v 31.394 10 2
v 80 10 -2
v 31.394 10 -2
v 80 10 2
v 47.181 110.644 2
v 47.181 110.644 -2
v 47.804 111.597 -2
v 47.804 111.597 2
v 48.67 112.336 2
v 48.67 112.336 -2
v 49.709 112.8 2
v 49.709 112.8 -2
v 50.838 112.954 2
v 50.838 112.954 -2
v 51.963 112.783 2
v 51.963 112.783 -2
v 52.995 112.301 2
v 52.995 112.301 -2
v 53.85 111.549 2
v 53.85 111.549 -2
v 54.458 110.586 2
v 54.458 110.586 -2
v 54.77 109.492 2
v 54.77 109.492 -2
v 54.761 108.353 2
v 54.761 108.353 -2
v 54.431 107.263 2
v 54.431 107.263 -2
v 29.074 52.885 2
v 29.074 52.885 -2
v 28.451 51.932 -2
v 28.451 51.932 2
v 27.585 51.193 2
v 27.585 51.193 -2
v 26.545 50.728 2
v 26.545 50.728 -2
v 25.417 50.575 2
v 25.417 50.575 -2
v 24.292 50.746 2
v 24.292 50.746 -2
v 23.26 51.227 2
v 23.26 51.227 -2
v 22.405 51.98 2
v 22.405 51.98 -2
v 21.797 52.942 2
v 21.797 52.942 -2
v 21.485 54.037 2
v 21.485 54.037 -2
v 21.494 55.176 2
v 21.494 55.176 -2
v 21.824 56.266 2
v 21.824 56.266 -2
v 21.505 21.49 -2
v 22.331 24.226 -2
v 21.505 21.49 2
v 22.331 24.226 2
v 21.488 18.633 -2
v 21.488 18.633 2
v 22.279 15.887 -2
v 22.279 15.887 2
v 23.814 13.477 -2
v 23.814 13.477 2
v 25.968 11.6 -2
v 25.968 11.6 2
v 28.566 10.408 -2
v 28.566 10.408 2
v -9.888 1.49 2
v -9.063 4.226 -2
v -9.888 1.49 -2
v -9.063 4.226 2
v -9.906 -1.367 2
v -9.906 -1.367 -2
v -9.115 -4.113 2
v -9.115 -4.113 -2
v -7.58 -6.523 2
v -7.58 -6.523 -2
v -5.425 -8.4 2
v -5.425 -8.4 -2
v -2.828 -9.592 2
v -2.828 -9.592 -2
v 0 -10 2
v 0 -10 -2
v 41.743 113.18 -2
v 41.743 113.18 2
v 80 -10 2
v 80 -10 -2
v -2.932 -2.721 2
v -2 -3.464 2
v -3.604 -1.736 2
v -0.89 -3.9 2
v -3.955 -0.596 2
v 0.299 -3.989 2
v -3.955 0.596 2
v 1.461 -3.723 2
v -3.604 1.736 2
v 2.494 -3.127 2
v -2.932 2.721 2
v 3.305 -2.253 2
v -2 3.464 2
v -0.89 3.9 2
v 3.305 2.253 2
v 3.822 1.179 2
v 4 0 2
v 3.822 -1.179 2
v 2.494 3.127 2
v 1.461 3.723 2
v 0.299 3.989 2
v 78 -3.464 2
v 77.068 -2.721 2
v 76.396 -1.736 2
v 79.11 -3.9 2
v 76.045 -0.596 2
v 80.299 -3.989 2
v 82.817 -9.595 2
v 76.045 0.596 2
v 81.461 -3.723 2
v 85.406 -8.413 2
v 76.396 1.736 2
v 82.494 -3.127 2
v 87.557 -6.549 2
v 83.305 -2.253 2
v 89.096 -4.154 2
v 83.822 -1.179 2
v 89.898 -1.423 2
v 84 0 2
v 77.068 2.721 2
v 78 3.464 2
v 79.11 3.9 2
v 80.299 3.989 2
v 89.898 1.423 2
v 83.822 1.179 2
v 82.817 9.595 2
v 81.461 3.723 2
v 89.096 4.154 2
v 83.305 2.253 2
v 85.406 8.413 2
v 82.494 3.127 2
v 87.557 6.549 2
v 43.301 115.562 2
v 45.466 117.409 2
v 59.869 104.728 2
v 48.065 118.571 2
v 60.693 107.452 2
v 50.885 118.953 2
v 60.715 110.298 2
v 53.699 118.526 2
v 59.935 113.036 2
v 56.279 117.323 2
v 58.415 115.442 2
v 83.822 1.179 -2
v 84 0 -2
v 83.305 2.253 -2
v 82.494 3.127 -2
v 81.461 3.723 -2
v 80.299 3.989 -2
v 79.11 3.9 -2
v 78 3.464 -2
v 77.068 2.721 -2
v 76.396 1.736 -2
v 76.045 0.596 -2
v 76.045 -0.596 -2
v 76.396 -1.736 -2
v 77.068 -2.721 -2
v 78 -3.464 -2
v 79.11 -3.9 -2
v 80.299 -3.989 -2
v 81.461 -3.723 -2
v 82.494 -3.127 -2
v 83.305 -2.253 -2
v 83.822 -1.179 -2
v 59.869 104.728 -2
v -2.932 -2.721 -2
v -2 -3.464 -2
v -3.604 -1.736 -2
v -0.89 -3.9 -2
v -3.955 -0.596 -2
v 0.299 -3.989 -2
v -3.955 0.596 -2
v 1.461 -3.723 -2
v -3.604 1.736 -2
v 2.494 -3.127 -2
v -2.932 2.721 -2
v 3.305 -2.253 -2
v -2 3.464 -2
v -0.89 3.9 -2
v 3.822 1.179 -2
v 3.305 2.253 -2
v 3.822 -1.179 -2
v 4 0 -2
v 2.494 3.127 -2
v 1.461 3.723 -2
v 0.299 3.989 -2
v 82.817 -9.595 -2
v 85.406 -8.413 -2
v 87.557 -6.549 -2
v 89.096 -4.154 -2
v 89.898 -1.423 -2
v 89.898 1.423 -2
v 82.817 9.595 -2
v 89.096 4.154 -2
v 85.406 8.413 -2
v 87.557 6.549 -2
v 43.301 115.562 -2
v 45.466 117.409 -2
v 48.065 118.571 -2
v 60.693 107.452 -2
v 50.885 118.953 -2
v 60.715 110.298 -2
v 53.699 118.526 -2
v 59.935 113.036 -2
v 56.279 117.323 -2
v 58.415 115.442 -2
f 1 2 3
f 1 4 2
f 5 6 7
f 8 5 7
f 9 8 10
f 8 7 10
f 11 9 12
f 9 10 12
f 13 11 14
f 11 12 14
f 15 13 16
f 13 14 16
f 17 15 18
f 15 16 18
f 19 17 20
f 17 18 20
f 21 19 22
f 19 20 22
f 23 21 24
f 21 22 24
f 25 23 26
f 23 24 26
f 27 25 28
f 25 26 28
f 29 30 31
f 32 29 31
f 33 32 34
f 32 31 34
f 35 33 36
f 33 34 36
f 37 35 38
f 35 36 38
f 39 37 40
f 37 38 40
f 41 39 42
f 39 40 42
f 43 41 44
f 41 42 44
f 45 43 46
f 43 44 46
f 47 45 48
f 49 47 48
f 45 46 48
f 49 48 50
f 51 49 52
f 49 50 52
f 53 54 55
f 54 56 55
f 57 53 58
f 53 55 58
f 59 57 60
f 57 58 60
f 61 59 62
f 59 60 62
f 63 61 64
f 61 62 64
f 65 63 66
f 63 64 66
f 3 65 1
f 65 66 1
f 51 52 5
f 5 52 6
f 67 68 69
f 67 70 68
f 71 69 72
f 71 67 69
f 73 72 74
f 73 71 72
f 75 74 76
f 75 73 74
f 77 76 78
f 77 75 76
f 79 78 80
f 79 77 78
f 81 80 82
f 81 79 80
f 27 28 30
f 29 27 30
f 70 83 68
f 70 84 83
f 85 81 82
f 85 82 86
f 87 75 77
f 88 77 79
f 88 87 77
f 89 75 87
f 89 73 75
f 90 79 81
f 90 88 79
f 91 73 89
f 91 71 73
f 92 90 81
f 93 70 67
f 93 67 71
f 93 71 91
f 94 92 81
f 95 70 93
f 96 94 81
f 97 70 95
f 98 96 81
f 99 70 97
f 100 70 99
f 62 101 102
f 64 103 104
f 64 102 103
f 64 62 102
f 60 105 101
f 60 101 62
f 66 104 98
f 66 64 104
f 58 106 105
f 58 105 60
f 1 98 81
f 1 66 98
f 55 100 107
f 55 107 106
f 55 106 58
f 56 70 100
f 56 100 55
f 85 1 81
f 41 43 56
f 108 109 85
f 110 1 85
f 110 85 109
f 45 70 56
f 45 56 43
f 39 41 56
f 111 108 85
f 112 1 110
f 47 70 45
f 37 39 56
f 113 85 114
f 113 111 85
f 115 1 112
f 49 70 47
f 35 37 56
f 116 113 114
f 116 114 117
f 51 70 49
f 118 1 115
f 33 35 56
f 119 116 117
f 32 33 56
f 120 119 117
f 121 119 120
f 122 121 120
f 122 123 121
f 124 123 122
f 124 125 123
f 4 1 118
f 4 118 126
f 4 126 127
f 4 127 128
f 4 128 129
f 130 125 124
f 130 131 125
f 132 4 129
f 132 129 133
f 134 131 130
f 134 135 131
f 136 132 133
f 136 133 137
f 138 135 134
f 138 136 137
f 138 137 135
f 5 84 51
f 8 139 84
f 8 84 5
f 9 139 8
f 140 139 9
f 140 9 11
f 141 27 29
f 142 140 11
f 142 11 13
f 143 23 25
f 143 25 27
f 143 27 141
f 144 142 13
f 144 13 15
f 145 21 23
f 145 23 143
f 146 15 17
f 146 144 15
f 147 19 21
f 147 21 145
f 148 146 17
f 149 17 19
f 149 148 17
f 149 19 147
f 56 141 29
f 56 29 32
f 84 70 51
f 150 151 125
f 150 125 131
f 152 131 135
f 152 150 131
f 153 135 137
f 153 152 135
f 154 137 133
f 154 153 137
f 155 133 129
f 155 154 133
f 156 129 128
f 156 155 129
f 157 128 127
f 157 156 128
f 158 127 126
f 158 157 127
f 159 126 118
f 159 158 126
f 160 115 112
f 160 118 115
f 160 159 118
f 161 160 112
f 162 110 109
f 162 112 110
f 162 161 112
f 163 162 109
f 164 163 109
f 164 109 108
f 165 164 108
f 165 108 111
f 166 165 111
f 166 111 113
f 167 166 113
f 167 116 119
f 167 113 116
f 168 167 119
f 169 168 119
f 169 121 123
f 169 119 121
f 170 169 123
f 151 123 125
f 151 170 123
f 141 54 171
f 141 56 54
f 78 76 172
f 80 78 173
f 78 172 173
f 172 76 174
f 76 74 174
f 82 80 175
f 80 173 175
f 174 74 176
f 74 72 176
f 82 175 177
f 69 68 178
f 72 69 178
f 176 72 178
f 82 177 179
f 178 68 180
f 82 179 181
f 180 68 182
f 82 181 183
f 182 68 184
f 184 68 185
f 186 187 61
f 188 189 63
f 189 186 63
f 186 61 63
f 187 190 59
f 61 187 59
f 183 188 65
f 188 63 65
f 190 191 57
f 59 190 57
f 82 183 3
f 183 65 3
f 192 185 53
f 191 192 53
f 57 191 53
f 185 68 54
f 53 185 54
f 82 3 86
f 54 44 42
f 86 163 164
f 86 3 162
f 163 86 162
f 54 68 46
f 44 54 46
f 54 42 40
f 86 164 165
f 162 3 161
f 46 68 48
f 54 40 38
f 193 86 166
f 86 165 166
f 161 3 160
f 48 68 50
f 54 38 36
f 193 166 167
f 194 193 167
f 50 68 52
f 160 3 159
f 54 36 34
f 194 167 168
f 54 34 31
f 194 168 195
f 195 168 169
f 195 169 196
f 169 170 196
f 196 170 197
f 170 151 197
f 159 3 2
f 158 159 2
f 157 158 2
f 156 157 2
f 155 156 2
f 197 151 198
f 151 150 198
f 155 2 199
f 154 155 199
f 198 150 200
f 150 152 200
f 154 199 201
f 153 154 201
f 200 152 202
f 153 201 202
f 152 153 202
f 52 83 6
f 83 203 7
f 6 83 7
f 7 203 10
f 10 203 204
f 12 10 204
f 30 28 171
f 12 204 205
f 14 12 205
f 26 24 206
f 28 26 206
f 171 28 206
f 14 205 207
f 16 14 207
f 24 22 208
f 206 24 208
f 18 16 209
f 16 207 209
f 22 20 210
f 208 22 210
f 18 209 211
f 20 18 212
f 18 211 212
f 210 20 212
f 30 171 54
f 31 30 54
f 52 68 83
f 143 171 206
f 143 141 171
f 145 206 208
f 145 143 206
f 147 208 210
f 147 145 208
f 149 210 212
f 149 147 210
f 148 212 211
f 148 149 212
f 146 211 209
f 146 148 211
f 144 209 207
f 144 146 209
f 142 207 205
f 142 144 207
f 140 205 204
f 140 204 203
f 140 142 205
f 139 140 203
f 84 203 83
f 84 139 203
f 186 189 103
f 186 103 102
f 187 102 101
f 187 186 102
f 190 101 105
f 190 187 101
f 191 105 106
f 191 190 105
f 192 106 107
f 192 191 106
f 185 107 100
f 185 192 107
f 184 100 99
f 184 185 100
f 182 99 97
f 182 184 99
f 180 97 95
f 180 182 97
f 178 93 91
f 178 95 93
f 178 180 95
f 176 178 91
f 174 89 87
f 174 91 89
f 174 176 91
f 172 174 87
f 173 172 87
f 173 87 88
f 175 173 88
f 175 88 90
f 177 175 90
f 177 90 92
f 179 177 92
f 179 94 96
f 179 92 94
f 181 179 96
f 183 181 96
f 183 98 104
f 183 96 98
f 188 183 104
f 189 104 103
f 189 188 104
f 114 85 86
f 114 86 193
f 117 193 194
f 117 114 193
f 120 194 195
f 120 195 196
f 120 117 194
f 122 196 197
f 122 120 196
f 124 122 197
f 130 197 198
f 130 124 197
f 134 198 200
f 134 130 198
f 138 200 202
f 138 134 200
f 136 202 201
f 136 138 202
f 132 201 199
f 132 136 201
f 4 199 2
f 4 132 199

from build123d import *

# Parameters (mm, degrees)
BOSS_EXTRUDE1_DEPTH     = 2
CUT_EXTRUDE1_DEPTH      = 150.177687816
CUT_EXTRUDE1_DEPTH_BACK = 150.177687816
CUT_EXTRUDE2_DEPTH      = 150.177687816
CUT_EXTRUDE2_DEPTH_BACK = 150.177687816
SKETCH4_R               = 4
FILLET2_R               = 10


with BuildPart() as part:
    # Sketch2 → Boss-Extrude1 (new, symmetric)
    with BuildSketch(Plane.XY):
        with BuildLine():
            ThreePointArc((0, 10), (-5.372996083, 8.433914458), (-9.06307787, 4.226182617))
            ThreePointArc((-9.06307787, 4.226182617), (-8.433914458, -5.372996083), (0, -10))
            ThreePointArc((0, -10), (5.372996083, -8.433914458), (9.06307787, -4.226182617))
            Line((9.06307787, -4.226182617), (15.696855771, 10))
            Line((15.696855771, 10), (0, 10))
        make_face()
        with BuildLine():
            Line((41.742866429, 113.179881771), (-9.06307787, 4.226182617))
            ThreePointArc((-9.06307787, 4.226182617), (-5.372996083, 8.433914458), (0, 10))
            Line((0, 10), (15.696855771, 10))
            Line((15.696855771, 10), (59.86902217, 104.727516536))
            ThreePointArc((59.86902217, 104.727516536), (55.032126917, 118.016777024), (41.742866429, 113.179881771))
        make_face()
        with BuildLine():
            ThreePointArc((9.06307787, -4.226182617), (5.372996083, -8.433914458), (0, -10))
            Line((0, -10), (80, -10))
            ThreePointArc((80, -10), (90, 0), (80, 10))
            Line((80, 10), (15.696855771, 10))
            Line((15.696855771, 10), (9.06307787, -4.226182617))
        make_face()
    extrude(amount=BOSS_EXTRUDE1_DEPTH, both=True)

    # Sketch3 → Cut-Extrude1 (cut, two sides: drawn at the far end of the back side and taken through both)
    with BuildSketch(Plane.XY.offset(-CUT_EXTRUDE1_DEPTH_BACK)):
        with BuildLine():
            Line((54.431175448, 107.263226106), (29.074079743, 52.884758884))
            ThreePointArc((29.074079743, 52.884758884), (23.758375548, 50.950000783), (21.823617447, 56.265704978))
            Line((21.823617447, 56.265704978), (47.180713151, 110.6441722))
            ThreePointArc((47.180713151, 110.6441722), (52.496417346, 112.578930301), (54.431175448, 107.263226106))
        make_face()
    extrude(amount=CUT_EXTRUDE1_DEPTH + CUT_EXTRUDE1_DEPTH_BACK, mode=Mode.SUBTRACT)

    # Sketch4 → Cut-Extrude2 (cut, two sides: drawn at the far end of the back side and taken through both)
    with BuildSketch(Plane.XY.offset(-CUT_EXTRUDE2_DEPTH_BACK)):
        with Locations((80, 0)):
            Circle(SKETCH4_R)
        Circle(SKETCH4_R)
    extrude(amount=CUT_EXTRUDE2_DEPTH + CUT_EXTRUDE2_DEPTH_BACK, mode=Mode.SUBTRACT)

    # Fillet2
    fillet2_edges = [part.edges().sort_by_distance(p)[0] for p in [
        (15.696855771, 10, 0),
    ]]
    fillet(fillet2_edges, radius=FILLET2_R)


solid = part.part
